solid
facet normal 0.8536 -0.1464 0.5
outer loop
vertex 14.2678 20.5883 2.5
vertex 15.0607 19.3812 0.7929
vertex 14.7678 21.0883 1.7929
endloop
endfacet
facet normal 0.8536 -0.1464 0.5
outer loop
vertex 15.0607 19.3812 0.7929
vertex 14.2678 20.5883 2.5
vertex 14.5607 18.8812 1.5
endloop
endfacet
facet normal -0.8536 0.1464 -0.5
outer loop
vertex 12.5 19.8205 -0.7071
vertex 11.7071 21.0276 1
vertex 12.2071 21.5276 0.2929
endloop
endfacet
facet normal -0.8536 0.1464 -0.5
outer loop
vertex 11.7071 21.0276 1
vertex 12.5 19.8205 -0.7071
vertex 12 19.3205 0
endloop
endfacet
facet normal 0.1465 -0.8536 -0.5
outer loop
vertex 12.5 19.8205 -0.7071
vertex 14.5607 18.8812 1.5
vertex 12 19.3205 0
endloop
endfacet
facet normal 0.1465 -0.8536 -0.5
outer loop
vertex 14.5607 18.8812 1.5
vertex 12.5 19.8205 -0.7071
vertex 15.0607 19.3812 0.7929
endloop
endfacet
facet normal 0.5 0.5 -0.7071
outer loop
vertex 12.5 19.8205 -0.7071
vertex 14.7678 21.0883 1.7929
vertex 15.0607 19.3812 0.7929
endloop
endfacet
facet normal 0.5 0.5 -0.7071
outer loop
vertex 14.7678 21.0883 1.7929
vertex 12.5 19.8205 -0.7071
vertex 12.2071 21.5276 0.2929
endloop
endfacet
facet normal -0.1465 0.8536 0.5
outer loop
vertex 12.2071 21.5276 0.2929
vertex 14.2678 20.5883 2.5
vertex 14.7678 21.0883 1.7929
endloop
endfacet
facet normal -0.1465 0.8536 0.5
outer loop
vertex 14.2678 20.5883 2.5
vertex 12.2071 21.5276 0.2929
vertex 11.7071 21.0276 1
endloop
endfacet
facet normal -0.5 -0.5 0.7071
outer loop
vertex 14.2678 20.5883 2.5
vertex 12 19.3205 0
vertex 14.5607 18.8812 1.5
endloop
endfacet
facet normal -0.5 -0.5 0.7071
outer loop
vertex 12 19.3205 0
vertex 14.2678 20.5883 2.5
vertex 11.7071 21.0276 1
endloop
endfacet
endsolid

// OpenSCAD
//
// CockpitSCADlib Copyright Patrick A. Callahan 2021
// Framingham, Ma U.S.A.

// This file is part of CockpitSCADlib.
//
// CockpitSCADlib is free software: you can redistribute it and/or modify it under the terms of the
// GNU General Public License as published by the Free Software Foundation, either version 3 of
// the License, or (at your option) any later version.
//
// CockpitSCADlib is distributed in the hope that it will be useful, but WITHOUT ANY WARRANTY;
// without even the implied warranty of MERCHANTABILITY or FITNESS FOR A PARTICULAR PURPOSE.
// See the GNU General Public License for more details.
//
// You should have received a copy of the GNU General Public License along with CockpitSCADlib.
// If not, see <https://www.gnu.org/licenses/>.
//
module move(position=[0,0,0], 
            eps_position=[0,0,0],
            radial=[0,0,0],
            rotation=[0,0,0]) {
  radial_position=([sin(radial[0])*radial[1],cos(radial[0])*radial[1],radial[2]]);
  translate(position+eps_position+radial_position)
    rotate(rotation)
      children();
}
move(position=[1,1,1],eps_position=[1,1,1],rotation=[45,45,45],radial=[30,20,-2]) cube([1,2,3]);
